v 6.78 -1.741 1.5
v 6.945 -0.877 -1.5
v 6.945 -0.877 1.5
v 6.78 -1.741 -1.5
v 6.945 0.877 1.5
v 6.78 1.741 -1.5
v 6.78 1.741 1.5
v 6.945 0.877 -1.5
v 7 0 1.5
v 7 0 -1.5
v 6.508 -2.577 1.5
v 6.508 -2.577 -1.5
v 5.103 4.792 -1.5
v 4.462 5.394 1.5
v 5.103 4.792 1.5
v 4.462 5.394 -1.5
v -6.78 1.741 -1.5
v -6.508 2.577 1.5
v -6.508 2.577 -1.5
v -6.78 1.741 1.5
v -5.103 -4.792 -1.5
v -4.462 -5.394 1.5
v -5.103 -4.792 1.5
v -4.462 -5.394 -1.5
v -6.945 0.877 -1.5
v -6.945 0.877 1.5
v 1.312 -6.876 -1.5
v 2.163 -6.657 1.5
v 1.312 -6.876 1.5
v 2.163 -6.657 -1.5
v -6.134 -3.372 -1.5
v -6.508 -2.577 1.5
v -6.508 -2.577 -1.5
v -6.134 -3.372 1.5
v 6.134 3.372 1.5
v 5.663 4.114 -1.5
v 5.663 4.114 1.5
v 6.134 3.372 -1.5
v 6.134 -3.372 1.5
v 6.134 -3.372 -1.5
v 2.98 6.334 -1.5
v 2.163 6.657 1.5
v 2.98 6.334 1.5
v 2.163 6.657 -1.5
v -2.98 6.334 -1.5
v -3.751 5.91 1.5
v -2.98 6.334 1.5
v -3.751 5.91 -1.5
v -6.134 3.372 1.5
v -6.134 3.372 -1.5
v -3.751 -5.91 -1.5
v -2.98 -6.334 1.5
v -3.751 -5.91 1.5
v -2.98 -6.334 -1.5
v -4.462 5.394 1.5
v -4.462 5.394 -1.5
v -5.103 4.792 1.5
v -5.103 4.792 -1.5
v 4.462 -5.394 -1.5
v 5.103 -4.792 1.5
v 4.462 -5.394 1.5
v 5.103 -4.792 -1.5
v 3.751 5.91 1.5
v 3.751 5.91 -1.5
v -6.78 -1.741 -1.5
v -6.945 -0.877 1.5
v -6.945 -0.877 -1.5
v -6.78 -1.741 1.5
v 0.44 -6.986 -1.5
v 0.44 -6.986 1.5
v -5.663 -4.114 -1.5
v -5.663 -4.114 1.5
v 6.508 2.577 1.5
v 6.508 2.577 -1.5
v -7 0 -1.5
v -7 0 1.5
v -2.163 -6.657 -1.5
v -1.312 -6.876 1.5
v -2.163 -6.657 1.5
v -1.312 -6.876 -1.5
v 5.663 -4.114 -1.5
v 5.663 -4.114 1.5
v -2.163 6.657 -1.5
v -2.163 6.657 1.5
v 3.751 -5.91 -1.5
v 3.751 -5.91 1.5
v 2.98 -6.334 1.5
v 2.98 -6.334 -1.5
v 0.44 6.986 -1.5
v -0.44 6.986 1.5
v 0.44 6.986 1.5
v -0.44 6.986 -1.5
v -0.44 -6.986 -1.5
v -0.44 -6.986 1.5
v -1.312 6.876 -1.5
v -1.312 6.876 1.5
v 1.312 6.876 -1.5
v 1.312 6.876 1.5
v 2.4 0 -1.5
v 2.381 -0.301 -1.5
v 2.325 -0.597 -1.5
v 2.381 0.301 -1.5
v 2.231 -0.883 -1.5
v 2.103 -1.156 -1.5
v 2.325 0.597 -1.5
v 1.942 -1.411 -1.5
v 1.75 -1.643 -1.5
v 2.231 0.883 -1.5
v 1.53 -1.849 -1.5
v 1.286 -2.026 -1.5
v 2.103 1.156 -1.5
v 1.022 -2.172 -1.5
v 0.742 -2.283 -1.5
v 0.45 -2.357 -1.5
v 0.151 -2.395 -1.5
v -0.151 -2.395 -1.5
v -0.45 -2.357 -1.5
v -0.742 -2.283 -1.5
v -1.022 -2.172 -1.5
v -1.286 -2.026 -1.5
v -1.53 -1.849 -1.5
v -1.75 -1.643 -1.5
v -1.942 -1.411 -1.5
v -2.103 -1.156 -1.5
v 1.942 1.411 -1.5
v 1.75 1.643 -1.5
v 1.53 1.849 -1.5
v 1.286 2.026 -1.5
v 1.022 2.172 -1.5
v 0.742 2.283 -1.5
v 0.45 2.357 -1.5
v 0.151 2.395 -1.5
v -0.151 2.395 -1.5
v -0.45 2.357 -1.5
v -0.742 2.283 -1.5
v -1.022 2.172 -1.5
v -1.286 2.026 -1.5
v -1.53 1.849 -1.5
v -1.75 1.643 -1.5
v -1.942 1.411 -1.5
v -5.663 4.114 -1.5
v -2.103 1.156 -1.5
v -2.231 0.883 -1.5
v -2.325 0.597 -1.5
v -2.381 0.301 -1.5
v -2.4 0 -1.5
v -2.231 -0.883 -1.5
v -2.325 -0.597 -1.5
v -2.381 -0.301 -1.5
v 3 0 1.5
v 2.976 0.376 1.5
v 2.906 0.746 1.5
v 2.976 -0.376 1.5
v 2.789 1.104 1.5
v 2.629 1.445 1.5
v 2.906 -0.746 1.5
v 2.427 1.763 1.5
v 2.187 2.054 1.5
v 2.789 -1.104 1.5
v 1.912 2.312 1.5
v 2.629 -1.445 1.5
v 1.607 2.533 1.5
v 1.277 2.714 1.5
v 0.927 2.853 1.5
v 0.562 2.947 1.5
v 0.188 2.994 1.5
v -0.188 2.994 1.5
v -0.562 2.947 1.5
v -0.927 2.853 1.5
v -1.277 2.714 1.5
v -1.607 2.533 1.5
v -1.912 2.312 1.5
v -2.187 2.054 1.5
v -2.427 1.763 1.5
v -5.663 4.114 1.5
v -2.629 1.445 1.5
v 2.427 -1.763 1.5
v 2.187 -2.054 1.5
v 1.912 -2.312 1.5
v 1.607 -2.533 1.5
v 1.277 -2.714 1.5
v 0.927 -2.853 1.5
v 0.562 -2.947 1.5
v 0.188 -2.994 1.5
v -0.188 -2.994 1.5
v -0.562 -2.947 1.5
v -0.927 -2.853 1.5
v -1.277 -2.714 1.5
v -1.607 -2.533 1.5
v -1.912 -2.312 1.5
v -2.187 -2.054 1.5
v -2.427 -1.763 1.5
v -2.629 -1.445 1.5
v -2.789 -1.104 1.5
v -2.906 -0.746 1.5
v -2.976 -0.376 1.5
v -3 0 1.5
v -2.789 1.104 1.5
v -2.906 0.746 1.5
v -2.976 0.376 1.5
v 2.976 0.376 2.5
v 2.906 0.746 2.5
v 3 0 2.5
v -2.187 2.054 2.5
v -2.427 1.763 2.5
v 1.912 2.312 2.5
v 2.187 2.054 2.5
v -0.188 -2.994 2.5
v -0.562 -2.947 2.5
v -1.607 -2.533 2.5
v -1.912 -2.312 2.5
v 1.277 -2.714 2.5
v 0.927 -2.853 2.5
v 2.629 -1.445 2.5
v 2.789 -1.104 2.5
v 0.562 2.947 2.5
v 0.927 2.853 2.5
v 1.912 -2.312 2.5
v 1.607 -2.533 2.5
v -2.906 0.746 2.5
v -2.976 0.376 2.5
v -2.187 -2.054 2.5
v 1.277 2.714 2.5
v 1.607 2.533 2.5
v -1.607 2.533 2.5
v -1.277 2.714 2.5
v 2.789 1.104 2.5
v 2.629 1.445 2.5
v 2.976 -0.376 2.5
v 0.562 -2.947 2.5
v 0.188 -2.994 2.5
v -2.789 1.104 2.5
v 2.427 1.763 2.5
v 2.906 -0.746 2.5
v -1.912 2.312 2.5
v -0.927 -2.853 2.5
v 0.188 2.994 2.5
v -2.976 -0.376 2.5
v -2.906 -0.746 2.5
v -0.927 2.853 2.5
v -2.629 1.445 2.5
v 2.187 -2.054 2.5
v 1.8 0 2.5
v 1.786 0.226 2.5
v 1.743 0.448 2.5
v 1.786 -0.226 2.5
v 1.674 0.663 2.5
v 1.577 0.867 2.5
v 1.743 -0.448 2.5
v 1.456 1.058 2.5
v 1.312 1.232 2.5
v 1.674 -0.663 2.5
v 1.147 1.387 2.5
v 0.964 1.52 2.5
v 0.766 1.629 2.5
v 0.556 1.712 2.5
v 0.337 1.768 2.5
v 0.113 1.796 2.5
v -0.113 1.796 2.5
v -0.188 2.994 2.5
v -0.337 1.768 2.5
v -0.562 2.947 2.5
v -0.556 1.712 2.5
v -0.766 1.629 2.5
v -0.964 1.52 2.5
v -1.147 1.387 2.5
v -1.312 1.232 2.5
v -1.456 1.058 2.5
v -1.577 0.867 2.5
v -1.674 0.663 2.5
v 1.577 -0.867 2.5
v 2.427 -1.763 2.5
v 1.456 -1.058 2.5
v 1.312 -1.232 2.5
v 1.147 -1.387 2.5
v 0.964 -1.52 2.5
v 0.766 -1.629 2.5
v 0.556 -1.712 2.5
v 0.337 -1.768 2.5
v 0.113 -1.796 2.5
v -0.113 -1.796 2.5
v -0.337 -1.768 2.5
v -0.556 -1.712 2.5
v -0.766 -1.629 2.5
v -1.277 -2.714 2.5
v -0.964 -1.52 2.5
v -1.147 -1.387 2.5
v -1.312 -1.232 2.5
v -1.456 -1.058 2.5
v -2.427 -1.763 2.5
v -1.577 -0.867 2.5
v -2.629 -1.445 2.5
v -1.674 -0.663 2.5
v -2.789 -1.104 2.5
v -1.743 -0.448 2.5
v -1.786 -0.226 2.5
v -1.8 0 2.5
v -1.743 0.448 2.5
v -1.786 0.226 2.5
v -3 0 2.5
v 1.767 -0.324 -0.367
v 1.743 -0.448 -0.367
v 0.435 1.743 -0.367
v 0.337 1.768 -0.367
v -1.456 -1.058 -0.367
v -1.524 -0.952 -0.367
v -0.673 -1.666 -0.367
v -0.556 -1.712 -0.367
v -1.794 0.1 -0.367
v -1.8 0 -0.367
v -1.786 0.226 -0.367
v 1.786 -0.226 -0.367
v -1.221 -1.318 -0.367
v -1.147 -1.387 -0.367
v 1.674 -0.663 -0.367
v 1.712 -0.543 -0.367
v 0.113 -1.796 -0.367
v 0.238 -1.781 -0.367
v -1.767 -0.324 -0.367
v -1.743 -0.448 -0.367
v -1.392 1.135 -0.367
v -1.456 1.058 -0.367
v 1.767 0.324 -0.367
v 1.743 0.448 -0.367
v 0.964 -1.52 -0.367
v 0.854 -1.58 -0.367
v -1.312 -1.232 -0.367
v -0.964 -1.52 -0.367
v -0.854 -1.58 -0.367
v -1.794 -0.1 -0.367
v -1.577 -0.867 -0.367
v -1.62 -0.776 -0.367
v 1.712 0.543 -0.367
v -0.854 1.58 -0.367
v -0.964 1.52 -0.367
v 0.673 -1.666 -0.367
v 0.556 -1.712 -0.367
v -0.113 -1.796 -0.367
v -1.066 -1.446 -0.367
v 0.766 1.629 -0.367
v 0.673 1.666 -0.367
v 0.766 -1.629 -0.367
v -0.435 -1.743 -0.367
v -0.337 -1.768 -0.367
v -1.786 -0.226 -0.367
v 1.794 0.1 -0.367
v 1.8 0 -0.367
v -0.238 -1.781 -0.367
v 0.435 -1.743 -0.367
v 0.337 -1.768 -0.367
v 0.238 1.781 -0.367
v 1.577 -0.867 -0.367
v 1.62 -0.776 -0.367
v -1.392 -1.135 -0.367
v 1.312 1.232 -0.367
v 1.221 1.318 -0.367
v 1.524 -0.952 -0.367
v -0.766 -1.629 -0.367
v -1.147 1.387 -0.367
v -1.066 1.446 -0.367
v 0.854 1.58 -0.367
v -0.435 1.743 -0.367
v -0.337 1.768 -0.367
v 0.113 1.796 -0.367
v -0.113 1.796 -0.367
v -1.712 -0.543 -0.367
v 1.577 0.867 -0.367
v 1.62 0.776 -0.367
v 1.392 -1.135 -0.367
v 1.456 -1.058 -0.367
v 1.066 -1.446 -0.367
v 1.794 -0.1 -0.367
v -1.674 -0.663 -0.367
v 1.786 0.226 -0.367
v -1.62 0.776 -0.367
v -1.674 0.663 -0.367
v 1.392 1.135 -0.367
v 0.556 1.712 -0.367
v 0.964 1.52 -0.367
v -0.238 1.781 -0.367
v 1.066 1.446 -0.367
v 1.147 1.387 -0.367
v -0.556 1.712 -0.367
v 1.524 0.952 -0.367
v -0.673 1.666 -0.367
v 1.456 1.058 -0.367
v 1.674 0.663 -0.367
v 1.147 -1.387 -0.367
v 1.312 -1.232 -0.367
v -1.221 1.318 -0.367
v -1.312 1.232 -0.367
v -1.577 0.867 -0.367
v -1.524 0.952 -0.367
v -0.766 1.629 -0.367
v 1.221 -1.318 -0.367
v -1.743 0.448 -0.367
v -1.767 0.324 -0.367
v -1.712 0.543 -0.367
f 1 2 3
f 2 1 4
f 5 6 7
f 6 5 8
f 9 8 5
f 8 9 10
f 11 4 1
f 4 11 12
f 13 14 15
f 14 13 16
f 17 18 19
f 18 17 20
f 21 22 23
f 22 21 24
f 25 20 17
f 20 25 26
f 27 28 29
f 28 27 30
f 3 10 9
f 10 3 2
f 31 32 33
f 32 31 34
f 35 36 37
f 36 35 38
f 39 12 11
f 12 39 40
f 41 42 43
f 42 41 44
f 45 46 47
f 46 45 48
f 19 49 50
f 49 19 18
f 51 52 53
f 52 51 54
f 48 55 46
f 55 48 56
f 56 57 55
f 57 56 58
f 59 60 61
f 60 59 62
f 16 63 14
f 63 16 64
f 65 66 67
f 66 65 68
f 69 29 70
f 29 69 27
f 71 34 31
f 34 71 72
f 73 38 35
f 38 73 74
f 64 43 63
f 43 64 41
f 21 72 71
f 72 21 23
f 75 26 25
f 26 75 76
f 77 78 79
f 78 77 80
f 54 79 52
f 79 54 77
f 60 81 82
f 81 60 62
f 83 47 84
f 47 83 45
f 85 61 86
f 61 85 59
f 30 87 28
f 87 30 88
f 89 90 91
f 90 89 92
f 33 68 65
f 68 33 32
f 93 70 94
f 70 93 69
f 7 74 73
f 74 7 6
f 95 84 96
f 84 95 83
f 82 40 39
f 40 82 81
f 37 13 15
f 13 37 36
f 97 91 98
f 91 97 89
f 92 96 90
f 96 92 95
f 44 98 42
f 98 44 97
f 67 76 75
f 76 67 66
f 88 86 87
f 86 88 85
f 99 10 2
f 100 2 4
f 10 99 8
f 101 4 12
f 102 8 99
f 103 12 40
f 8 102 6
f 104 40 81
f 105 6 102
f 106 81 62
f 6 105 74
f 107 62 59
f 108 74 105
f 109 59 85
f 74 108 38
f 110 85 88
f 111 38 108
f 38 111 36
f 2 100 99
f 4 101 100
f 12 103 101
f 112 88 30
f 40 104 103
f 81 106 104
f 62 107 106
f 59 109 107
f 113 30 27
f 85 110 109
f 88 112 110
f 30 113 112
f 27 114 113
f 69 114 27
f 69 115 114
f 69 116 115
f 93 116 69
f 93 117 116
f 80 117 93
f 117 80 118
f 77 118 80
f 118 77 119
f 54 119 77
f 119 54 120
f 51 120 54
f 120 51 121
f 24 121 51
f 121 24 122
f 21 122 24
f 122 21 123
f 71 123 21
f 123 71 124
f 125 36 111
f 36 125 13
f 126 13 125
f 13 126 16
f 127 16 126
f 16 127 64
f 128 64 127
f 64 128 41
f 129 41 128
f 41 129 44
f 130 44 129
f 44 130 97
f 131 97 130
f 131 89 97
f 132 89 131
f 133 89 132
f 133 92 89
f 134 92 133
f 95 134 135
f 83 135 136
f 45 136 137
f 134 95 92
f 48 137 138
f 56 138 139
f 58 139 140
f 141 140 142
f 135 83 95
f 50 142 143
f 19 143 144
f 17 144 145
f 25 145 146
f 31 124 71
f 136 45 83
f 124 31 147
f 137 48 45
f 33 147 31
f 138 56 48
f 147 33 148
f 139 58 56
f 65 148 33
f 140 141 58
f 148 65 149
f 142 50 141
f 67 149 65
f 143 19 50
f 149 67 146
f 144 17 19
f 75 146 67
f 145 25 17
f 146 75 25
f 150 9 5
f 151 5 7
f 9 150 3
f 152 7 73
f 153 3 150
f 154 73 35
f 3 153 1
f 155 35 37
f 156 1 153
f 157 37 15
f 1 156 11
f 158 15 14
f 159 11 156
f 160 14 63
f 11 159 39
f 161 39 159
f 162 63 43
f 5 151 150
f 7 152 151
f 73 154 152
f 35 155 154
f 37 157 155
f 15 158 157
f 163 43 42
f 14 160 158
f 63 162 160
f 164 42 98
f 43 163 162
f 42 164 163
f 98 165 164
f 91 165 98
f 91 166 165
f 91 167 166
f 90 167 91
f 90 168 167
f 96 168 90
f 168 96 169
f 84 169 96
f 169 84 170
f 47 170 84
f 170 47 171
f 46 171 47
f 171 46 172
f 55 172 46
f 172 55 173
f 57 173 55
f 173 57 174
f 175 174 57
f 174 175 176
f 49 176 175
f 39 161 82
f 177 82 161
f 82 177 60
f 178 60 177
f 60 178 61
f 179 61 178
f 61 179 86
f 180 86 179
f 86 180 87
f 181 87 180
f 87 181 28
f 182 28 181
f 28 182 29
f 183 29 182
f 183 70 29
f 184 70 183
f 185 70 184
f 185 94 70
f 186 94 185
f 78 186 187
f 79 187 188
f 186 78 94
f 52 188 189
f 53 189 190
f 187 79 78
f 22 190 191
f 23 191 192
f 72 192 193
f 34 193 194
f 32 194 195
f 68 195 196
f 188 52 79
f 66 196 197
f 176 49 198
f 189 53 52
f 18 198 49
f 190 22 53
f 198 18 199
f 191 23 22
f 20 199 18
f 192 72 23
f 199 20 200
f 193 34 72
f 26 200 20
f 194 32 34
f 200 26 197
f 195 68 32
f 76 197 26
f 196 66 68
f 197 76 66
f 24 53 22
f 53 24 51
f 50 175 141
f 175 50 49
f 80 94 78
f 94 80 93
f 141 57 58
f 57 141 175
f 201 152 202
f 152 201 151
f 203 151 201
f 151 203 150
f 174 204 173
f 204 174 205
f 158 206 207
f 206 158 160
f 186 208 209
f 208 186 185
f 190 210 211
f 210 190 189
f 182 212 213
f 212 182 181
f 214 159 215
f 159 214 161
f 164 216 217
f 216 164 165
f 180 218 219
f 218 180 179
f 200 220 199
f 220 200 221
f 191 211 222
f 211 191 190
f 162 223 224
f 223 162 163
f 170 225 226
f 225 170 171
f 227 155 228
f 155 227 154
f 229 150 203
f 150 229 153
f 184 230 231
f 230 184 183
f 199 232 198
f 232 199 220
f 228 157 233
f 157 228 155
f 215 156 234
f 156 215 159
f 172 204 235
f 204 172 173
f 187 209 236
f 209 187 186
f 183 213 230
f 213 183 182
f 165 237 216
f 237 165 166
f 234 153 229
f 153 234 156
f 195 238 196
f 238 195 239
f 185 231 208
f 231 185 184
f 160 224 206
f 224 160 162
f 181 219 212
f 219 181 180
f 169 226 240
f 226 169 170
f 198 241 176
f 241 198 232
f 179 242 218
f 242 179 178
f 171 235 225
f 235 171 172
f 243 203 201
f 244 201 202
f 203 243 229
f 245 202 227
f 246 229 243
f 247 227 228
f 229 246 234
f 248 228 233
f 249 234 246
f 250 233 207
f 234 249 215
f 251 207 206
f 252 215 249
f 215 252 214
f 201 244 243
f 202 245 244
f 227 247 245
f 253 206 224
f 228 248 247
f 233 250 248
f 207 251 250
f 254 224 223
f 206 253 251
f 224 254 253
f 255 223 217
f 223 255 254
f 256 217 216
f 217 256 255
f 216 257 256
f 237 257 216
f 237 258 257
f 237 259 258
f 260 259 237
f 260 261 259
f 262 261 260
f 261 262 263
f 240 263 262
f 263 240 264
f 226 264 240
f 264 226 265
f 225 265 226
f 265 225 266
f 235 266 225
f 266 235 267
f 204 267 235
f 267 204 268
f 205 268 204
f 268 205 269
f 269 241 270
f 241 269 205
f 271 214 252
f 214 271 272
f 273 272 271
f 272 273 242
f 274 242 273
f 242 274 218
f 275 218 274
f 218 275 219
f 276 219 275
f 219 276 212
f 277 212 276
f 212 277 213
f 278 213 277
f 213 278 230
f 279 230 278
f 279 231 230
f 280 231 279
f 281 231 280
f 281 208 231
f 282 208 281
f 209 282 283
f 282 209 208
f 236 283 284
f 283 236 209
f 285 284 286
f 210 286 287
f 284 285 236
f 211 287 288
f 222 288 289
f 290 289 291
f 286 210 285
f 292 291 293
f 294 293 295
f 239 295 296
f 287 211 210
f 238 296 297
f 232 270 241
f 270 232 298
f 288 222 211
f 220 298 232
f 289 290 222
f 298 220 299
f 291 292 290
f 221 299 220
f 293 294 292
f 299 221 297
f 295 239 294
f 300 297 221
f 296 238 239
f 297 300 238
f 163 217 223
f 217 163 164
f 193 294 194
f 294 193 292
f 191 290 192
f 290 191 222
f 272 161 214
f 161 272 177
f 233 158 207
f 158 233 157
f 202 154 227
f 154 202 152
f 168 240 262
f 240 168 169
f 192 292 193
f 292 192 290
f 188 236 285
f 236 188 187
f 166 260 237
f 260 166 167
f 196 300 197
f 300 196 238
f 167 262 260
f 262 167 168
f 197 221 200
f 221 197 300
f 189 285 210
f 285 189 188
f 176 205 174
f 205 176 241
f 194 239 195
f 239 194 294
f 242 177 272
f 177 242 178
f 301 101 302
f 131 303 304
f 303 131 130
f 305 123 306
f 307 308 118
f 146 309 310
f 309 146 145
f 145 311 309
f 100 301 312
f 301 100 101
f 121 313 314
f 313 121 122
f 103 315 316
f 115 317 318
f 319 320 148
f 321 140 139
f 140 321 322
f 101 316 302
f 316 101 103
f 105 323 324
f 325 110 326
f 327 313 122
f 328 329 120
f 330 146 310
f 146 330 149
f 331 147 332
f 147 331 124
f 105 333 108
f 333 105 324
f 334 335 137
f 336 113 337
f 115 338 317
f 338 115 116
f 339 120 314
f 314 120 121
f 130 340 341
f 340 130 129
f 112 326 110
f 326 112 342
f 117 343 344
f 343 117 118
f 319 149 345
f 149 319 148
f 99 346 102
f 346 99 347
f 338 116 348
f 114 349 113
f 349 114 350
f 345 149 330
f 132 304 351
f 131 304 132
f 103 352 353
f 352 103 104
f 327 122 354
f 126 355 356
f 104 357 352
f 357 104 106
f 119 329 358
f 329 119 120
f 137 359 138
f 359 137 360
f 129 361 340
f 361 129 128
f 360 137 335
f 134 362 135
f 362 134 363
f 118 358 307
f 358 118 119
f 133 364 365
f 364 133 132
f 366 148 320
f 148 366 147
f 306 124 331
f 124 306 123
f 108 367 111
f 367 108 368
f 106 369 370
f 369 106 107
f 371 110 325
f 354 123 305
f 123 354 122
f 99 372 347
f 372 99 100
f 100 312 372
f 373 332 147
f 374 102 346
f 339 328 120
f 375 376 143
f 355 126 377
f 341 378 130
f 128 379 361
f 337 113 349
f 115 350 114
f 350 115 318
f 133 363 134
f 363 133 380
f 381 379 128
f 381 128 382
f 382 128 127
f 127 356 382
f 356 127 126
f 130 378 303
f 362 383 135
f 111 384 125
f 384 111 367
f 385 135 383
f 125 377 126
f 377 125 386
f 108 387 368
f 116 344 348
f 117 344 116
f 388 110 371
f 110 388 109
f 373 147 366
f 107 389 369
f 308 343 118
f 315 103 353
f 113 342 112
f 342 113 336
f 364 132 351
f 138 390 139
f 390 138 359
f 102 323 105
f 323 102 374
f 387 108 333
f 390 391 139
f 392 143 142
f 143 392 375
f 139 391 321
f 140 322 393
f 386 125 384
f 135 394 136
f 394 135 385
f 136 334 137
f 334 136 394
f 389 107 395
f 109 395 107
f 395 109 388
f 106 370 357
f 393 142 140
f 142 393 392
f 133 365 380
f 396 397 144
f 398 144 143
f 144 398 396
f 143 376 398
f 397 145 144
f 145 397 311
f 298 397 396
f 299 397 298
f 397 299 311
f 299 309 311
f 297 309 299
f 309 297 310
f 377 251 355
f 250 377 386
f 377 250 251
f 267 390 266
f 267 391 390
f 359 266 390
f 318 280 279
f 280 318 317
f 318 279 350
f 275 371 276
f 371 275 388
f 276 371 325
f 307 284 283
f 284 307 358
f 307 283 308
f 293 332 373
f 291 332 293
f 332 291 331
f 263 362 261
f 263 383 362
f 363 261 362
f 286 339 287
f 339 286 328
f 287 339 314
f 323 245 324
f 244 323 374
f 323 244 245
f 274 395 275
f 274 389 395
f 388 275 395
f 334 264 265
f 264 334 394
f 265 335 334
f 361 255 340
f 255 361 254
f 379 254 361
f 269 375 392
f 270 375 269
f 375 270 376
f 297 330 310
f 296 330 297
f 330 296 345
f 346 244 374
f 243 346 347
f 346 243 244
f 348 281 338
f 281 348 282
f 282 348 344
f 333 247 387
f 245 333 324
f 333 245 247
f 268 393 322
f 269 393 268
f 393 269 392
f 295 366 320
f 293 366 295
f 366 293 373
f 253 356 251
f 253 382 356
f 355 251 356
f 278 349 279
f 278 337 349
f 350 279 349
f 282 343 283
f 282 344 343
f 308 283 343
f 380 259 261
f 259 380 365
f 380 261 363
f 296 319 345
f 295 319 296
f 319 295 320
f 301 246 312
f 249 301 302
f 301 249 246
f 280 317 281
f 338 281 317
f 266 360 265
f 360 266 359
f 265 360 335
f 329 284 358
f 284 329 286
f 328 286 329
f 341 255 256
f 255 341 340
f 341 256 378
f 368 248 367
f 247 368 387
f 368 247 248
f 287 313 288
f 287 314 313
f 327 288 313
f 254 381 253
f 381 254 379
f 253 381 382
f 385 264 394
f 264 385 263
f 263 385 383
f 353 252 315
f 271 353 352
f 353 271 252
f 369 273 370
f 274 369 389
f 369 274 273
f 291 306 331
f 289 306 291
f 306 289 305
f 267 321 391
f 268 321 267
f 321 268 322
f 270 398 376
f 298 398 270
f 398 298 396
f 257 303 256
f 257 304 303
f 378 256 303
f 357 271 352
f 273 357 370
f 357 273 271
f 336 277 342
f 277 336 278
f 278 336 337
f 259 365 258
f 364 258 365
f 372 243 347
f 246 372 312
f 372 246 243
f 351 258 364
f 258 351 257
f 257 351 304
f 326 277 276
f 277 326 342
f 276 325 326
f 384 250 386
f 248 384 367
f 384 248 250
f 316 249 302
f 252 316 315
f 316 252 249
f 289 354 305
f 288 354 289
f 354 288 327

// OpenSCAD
$fn = 50;


difference() {
	union() {
		translate(v = [0, 0, -1.5000000000]) {
			cylinder(h = 3, r = 7.0000000000);
		}
		translate(v = [0, 0, -1.5000000000]) {
			cylinder(h = 4, r = 3.0000000000);
		}
	}
	union() {
		translate(v = [0, 0, -1.5000000000]) {
			rotate(a = [0, 180, 0]) {
				difference() {
					union() {
						translate(v = [0, 0, -1.7000000000]) {
							cylinder(h = 1.7000000000, r1 = 1.5000000000, r2 = 2.4000000000);
						}
						translate(v = [0, 0, -4.0000000000]) {
							cylinder(h = 4, r = 1.5000000000);
						}
						translate(v = [0, 0, -4.0000000000]) {
							cylinder(h = 4, r = 1.8000000000);
						}
						translate(v = [0, 0, -4.0000000000]) {
							cylinder(h = 4, r = 1.5000000000);
						}
					}
					union();
				}
			}
		}
		translate(v = [0, 0, -100.0000000000]) {
			cylinder(h = 200, r = 1.5000000000);
		}
	}
}
